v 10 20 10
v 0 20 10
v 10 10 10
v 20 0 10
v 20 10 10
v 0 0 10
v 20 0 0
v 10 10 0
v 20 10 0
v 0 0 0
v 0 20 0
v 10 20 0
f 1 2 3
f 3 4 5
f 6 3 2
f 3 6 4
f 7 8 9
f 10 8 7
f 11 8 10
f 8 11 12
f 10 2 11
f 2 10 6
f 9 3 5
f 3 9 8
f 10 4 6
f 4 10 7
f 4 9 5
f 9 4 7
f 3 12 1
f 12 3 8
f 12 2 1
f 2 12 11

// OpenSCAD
color("red") { cube(10); translate([10,0,0]) cube(10); }
color("blue") translate([0,10,0]) cube(10);
